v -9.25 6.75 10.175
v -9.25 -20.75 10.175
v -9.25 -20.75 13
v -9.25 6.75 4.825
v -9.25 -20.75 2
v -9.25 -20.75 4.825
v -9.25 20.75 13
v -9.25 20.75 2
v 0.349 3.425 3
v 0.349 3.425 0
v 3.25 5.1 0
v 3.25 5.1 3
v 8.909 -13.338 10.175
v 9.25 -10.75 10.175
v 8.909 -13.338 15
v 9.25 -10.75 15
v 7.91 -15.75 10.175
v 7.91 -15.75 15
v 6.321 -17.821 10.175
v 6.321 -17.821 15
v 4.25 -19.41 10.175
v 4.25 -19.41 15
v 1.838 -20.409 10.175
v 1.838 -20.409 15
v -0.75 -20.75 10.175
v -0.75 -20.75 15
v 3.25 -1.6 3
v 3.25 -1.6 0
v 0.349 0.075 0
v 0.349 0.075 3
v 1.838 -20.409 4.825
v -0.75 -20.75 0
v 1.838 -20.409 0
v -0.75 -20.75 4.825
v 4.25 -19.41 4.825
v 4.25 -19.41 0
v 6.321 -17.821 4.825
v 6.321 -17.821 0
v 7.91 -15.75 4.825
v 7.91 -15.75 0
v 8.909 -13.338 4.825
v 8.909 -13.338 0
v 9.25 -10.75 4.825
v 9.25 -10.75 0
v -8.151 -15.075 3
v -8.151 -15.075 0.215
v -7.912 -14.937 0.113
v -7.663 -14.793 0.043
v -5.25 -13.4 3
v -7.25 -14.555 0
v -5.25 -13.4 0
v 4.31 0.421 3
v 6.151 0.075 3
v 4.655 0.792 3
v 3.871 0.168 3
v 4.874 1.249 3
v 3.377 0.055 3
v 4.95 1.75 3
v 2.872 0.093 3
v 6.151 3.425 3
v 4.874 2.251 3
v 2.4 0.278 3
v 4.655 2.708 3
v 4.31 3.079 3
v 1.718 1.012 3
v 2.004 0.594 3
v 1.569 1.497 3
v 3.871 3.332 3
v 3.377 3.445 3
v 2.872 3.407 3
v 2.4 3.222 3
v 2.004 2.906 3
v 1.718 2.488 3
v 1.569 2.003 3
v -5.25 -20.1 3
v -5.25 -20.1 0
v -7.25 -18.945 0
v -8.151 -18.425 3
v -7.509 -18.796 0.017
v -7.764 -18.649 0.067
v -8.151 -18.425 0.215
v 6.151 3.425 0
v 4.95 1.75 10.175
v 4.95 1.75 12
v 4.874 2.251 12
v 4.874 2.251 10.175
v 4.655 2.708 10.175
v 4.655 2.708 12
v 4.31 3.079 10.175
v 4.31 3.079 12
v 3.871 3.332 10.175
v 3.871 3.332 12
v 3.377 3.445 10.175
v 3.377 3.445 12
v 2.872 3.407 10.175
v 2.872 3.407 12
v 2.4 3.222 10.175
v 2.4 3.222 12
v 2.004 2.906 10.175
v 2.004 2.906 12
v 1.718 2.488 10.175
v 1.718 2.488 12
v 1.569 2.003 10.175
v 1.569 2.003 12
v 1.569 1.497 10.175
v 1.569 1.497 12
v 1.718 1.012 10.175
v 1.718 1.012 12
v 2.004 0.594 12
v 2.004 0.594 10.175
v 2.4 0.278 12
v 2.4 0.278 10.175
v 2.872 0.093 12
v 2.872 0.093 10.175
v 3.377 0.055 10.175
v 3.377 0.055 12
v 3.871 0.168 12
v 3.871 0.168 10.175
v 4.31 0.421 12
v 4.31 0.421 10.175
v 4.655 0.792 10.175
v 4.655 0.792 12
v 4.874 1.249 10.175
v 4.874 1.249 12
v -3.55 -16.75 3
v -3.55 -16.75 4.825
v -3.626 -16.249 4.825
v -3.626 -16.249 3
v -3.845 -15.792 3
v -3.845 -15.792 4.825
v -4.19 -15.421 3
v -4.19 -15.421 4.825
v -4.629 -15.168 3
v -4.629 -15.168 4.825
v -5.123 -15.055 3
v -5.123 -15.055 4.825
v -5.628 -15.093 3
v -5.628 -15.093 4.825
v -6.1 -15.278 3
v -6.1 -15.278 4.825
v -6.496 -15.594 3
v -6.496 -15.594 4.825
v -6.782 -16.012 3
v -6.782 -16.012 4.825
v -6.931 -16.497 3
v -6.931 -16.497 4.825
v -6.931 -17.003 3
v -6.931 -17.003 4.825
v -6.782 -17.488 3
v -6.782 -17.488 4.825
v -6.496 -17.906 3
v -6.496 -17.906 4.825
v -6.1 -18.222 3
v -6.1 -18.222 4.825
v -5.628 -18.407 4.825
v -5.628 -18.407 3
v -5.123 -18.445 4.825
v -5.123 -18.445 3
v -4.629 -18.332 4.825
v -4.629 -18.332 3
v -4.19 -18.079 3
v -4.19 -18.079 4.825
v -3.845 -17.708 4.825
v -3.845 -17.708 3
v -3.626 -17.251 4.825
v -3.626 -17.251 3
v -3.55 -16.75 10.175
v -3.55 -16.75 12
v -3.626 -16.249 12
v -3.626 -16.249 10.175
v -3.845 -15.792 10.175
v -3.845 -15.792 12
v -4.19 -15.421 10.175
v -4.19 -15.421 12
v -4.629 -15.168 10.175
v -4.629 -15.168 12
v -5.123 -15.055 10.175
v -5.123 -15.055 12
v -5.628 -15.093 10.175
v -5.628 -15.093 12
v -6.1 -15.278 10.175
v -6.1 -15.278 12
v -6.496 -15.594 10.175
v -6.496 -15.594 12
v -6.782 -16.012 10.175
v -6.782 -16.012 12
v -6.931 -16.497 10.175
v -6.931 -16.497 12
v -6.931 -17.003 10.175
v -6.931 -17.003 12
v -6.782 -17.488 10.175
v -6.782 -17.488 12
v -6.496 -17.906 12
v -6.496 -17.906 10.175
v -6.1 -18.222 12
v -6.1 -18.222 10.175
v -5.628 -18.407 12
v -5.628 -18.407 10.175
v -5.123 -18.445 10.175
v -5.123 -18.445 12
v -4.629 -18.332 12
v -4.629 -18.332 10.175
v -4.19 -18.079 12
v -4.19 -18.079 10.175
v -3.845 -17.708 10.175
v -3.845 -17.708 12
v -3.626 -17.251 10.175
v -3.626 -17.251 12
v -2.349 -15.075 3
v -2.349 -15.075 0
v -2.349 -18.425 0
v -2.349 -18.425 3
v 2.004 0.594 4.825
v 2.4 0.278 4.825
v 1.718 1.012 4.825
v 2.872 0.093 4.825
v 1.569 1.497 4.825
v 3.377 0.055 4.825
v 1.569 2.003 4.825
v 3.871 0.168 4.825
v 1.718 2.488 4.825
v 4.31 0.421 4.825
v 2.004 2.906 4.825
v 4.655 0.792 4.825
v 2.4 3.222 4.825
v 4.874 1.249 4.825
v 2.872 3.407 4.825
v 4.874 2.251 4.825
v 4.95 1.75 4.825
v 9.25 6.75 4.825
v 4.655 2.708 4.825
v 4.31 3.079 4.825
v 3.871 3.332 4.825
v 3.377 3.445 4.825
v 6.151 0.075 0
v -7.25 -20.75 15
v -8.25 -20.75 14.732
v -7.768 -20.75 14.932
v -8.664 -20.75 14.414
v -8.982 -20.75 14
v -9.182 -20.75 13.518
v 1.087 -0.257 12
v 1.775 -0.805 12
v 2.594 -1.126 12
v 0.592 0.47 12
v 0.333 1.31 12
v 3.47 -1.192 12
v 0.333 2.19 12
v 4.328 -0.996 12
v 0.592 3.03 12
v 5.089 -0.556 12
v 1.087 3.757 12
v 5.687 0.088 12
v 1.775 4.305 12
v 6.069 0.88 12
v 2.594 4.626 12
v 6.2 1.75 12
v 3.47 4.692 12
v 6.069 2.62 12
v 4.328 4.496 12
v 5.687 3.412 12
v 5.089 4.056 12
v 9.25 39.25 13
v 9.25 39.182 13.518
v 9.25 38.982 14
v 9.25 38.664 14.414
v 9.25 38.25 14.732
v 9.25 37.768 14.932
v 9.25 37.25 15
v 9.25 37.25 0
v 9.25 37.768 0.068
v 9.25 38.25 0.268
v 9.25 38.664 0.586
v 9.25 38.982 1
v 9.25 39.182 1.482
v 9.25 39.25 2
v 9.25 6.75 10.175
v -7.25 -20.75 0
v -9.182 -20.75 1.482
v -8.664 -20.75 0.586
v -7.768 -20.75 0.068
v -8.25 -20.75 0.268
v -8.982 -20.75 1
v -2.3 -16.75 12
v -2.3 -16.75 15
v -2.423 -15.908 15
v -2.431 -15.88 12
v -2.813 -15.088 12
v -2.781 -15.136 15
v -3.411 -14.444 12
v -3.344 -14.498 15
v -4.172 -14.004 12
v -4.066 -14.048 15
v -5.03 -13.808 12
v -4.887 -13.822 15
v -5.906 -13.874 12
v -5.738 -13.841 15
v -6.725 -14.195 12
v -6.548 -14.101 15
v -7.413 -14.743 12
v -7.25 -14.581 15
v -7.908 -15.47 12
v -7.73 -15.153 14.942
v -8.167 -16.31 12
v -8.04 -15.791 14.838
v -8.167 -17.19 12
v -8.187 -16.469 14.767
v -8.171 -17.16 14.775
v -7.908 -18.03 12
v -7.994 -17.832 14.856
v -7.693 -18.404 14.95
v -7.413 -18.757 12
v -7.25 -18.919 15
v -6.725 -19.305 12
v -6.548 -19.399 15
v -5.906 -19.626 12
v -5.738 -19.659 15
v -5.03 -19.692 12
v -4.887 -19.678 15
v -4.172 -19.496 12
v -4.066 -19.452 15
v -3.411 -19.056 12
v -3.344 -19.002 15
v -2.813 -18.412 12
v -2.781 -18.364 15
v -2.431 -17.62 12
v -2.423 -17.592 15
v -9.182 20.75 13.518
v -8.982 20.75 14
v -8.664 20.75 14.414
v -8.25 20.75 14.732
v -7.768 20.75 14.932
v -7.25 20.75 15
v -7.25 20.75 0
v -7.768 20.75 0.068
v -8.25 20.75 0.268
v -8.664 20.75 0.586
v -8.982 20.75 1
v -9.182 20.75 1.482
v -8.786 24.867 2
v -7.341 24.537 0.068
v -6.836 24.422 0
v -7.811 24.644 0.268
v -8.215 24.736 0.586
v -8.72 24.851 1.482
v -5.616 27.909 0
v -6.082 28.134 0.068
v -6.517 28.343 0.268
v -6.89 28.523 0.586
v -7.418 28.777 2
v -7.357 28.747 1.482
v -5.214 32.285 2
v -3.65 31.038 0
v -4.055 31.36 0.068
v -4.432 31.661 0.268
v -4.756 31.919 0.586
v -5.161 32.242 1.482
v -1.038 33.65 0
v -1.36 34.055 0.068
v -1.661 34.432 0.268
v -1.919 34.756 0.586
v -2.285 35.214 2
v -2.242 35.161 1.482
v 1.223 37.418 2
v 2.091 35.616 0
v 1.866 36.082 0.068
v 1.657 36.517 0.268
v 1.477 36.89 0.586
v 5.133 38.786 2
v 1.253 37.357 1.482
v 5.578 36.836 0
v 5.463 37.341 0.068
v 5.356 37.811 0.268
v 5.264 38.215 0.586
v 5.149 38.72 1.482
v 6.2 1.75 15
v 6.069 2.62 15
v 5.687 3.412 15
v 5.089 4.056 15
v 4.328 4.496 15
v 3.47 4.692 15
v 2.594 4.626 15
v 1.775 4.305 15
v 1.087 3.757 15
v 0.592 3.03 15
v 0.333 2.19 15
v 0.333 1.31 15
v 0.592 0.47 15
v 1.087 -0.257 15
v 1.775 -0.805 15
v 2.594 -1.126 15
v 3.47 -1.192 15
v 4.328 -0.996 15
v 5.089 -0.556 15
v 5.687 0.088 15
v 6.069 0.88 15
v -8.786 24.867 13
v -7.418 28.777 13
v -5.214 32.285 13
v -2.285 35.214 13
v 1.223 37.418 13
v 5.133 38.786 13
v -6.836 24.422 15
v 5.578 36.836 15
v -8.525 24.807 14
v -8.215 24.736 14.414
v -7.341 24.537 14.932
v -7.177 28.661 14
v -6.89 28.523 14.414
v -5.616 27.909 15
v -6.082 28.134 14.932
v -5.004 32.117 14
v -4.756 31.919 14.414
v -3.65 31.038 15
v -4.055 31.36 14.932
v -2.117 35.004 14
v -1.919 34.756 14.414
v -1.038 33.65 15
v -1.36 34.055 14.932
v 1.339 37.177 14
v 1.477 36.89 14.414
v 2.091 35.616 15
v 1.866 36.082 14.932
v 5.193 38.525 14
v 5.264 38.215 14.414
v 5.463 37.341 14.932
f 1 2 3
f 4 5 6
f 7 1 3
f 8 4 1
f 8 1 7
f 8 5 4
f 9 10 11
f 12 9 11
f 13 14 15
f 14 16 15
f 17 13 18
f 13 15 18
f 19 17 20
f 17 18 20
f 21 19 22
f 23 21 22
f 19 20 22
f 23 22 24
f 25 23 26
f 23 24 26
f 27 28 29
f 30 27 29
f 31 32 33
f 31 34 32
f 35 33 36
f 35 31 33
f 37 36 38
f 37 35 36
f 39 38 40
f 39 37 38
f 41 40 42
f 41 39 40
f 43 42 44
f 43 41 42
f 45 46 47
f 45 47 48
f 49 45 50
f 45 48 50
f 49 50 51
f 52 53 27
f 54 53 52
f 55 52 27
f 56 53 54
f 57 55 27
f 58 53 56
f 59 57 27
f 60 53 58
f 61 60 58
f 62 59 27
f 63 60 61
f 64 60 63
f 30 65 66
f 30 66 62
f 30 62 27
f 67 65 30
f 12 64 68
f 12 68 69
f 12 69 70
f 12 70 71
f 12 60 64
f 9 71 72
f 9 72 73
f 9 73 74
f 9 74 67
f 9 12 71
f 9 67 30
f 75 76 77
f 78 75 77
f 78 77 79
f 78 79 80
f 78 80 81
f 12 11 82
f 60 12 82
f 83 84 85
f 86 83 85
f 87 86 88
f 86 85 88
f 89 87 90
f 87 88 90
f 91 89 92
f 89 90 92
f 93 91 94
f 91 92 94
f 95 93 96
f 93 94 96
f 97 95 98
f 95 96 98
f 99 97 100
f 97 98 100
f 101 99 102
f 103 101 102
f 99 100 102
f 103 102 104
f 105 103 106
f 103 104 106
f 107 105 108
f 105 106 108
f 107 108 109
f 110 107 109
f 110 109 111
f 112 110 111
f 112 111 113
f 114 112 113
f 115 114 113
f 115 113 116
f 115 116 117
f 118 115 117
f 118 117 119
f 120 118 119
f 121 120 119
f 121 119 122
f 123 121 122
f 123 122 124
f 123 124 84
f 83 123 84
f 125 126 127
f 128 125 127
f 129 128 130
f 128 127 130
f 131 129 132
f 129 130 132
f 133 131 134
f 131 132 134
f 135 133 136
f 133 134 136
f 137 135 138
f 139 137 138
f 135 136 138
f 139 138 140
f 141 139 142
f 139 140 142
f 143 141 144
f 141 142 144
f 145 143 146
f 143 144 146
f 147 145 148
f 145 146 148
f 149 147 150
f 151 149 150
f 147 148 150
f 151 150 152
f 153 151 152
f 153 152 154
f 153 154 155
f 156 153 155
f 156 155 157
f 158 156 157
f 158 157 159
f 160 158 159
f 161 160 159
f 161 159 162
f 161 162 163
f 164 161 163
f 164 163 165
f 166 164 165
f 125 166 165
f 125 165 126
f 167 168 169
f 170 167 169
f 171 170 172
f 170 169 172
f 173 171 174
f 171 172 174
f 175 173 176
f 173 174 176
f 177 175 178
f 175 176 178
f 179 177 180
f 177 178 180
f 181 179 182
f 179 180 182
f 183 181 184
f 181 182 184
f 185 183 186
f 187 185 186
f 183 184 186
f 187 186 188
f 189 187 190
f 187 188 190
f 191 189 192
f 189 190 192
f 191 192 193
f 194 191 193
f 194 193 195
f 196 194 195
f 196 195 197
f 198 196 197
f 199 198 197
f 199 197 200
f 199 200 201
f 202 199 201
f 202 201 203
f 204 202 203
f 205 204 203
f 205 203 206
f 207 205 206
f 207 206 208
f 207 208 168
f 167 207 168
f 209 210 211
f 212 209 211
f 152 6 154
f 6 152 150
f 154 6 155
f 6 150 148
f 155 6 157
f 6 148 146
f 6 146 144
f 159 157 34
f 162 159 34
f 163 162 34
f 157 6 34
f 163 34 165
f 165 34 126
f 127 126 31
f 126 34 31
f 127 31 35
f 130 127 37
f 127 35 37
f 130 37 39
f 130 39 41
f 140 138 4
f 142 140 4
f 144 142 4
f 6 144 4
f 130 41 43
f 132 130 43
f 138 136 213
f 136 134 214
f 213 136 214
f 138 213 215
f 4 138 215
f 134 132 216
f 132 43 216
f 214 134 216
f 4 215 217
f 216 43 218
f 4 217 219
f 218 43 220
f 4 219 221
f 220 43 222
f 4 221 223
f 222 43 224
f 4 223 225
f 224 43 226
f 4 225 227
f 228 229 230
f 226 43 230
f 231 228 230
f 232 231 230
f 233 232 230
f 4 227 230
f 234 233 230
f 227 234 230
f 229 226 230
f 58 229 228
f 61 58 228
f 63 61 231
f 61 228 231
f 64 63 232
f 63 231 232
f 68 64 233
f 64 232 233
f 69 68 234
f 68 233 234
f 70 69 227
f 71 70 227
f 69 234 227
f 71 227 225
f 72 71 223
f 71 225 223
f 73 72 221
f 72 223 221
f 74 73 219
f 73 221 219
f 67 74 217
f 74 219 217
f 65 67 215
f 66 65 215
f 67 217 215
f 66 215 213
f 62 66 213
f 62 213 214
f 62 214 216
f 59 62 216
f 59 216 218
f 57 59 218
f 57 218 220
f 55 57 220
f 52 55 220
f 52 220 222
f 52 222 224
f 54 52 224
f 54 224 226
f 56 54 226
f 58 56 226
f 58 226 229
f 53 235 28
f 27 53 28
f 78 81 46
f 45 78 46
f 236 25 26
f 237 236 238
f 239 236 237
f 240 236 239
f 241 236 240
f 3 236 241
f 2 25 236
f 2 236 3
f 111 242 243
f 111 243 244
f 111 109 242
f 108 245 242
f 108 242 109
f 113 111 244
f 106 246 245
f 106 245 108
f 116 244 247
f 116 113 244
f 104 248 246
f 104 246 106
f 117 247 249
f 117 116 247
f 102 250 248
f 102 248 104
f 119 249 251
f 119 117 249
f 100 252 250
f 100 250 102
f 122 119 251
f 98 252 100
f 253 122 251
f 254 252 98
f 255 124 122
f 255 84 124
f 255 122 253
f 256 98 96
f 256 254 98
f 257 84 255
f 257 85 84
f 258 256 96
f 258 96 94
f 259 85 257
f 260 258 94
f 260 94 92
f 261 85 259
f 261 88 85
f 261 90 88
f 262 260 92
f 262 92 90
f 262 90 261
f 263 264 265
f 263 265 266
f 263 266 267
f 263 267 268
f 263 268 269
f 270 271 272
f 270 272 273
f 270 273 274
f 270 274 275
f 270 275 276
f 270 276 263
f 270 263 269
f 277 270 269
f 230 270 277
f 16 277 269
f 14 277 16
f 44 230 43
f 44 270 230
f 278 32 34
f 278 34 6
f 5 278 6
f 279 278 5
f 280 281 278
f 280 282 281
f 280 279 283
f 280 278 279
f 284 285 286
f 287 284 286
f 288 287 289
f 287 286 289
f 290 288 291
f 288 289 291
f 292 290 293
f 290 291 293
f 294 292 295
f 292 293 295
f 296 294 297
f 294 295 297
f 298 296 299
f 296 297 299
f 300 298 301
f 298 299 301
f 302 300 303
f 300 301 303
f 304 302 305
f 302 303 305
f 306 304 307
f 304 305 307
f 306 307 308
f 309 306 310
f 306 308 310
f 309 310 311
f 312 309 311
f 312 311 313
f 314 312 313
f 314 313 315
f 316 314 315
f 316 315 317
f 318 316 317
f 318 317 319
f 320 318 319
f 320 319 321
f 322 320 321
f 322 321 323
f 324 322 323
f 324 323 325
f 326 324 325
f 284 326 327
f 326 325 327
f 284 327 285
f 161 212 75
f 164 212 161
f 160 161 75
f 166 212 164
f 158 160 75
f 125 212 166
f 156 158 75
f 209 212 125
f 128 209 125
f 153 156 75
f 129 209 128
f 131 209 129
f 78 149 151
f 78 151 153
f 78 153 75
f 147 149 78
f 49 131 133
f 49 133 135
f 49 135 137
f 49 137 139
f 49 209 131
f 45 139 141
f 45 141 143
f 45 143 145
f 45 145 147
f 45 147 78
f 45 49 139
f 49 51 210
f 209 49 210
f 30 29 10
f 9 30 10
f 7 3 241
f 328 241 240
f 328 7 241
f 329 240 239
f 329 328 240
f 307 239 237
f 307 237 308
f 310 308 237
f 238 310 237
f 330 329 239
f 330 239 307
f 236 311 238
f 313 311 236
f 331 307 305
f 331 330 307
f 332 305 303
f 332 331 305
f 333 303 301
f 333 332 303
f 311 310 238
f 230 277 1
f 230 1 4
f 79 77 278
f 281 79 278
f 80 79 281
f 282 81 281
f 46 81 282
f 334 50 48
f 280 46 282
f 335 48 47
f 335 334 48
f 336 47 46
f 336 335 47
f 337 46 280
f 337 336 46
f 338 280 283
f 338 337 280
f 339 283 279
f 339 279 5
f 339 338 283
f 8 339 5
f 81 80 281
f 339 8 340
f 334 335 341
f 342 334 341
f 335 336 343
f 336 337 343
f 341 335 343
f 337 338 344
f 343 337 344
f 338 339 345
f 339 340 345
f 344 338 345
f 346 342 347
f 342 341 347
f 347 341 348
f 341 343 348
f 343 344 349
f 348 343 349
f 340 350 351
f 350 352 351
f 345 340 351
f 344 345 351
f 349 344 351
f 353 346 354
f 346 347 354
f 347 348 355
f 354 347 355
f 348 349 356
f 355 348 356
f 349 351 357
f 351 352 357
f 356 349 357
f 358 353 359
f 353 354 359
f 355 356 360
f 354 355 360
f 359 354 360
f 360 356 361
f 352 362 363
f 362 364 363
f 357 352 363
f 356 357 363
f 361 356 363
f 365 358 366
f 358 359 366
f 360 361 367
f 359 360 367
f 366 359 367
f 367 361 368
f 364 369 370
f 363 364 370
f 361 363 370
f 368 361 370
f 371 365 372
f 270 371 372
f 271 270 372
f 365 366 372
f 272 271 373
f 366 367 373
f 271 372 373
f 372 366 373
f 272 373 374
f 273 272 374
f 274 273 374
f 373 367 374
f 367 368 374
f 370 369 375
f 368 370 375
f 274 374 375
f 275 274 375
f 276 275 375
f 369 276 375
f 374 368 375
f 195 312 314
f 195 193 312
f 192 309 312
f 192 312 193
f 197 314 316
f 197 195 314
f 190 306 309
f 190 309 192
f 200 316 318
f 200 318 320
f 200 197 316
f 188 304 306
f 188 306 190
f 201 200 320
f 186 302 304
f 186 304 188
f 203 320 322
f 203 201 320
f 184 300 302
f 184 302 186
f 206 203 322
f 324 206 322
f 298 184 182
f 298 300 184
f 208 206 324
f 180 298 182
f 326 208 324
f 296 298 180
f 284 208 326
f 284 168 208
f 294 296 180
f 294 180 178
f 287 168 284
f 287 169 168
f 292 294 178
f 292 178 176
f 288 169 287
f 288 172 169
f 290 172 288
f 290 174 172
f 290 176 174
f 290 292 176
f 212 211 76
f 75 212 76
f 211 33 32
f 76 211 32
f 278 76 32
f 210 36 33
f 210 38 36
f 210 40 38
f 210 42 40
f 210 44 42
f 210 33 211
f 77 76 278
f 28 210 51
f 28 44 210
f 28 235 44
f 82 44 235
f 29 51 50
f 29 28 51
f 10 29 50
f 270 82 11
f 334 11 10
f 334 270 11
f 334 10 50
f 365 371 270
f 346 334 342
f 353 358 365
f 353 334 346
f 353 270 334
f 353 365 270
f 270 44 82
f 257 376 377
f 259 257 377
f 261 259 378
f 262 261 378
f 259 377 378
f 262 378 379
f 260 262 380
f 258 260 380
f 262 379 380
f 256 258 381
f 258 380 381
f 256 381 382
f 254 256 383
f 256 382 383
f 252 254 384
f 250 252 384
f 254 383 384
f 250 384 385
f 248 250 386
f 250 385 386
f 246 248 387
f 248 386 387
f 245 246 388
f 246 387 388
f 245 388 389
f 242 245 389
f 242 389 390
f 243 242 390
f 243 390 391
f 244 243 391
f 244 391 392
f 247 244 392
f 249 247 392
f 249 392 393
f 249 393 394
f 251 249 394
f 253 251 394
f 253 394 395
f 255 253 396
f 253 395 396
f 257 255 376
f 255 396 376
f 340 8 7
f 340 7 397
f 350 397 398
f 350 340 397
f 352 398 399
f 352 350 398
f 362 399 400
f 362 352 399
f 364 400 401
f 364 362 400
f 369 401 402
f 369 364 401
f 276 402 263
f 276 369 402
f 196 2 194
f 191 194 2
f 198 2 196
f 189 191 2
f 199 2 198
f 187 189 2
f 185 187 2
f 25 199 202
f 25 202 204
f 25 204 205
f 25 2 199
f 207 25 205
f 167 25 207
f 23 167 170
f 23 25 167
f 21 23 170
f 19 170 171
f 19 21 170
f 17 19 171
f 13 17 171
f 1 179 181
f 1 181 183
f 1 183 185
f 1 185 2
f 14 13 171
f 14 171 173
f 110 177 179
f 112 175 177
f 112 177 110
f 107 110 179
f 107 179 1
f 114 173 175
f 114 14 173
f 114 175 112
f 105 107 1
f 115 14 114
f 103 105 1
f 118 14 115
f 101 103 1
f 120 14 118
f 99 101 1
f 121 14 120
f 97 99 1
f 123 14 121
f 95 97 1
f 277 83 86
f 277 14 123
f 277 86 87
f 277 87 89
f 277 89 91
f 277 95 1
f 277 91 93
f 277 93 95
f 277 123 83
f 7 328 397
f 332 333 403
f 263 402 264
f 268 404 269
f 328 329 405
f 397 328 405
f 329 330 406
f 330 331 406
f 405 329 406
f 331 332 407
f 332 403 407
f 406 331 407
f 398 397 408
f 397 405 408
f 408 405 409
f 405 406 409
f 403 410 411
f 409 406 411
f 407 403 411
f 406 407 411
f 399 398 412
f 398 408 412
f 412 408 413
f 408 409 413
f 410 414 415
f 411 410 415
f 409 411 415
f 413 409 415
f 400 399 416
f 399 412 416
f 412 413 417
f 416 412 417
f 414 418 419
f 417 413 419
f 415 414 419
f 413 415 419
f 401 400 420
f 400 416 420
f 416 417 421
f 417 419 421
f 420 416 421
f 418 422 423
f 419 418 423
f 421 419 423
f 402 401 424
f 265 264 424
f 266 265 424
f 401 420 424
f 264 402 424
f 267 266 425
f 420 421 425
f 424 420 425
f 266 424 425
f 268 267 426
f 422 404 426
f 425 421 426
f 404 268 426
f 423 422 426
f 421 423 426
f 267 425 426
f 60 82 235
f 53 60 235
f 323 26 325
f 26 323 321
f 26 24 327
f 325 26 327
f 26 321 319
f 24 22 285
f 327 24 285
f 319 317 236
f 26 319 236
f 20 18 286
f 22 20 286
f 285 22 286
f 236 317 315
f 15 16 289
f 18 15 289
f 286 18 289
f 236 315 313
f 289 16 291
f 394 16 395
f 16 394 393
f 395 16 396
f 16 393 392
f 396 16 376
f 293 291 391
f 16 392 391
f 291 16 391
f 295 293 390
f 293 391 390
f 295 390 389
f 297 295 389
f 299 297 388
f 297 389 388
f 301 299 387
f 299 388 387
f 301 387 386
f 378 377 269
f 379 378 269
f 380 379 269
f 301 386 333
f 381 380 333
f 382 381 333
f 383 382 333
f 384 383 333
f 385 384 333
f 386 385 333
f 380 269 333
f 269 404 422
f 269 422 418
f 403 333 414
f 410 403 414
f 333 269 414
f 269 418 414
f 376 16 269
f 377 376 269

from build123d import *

# Parameters (mm, degrees)
SALIENTE_EXTRUIR1_DEPTH = 15
CROQUIS2_W              = 5.35
CROQUIS2_H              = 27.5
CORTAR_EXTRUIR1_DEPTH   = 30
CROQUIS3_R              = 1.7
CORTAR_EXTRUIR2_DEPTH   = 30
REDONDEO1_R             = 10
REDONDEO2_R             = 2
CROQUIS4_R              = 2.95
CORTAR_EXTRUIR3_DEPTH   = 3
CORTAR_EXTRUIR4_DEPTH   = 3


with BuildPart() as part:
    # Croquis1 → Saliente-Extruir1 (new body)
    with BuildSketch(Plane.XY):
        with BuildLine():
            Line((9.25, -20.75), (-9.25, -20.75))
            Line((-9.25, -20.75), (-9.25, 20.75))
            ThreePointArc((-9.25, 20.75), (-3.831475452, 33.831475452), (9.25, 39.25))
            Line((9.25, 39.25), (9.25, 20.75))
            Line((9.25, 20.75), (9.25, -20.75))
        make_face()
    extrude(amount=SALIENTE_EXTRUIR1_DEPTH)

    # Croquis2 → Cortar-Extruir1 (cut)
    with BuildSketch(Plane(origin=(9.25, 0, 0), x_dir=(0, 0, -1), z_dir=(1, 0, 0))):
        with Locations((-7.5, -7)):
            Rectangle(CROQUIS2_W, CROQUIS2_H)
    extrude(amount=-CORTAR_EXTRUIR1_DEPTH, mode=Mode.SUBTRACT)

    # Croquis3 → Cortar-Extruir2 (cut)
    with BuildSketch(Plane.XY.offset(15)):
        with Locations((3.25, 1.75)):
            Circle(CROQUIS3_R)
        with Locations((-5.25, -16.75)):
            Circle(CROQUIS3_R)
    extrude(amount=-CORTAR_EXTRUIR2_DEPTH, mode=Mode.SUBTRACT)

    # Redondeo1
    redondeo1_edges = [part.edges().sort_by_distance(p)[0] for p in [
        (9.25, -20.75, 2.4125),
        (9.25, -20.75, 12.5875),
    ]]
    fillet(redondeo1_edges, radius=REDONDEO1_R)

    # Redondeo2
    redondeo2_edges = [part.edges().sort_by_distance(p)[0] for p in [
        (-3.831475452, 33.831475452, 15),
        (-9.25, 0, 0),
        (-3.831475452, 33.831475452, 0),
        (-9.25, 0, 15),
    ]]
    fillet(redondeo2_edges, radius=REDONDEO2_R)

    # Croquis4 → Cortar-Extruir3 (cut)
    with BuildSketch(Plane.XY.offset(15)):
        with Locations((3.25, 1.75)):
            Circle(CROQUIS4_R)
        with Locations((-5.25, -16.75)):
            Circle(CROQUIS4_R)
    extrude(amount=-CORTAR_EXTRUIR3_DEPTH, mode=Mode.SUBTRACT)

    # Croquis5 → Cortar-Extruir4 (cut)
    with BuildSketch(Plane(origin=(0, 0, 0), x_dir=(-1, 0, 0), z_dir=(0, 0, -1))):
        Polygon((-0.348814897, 3.425), (-3.25, 5.1), (-6.151185103, 3.425), (-6.151185103, 0.075), (-3.25, -1.6), (-0.348814897, 0.075), align=None)
        Polygon((5.25, -13.4), (2.348814897, -15.075), (2.348814897, -18.425), (5.25, -20.1), (8.151185103, -18.425), (8.151185103, -15.075), align=None)
    extrude(amount=-CORTAR_EXTRUIR4_DEPTH, mode=Mode.SUBTRACT)


solid = part.part
